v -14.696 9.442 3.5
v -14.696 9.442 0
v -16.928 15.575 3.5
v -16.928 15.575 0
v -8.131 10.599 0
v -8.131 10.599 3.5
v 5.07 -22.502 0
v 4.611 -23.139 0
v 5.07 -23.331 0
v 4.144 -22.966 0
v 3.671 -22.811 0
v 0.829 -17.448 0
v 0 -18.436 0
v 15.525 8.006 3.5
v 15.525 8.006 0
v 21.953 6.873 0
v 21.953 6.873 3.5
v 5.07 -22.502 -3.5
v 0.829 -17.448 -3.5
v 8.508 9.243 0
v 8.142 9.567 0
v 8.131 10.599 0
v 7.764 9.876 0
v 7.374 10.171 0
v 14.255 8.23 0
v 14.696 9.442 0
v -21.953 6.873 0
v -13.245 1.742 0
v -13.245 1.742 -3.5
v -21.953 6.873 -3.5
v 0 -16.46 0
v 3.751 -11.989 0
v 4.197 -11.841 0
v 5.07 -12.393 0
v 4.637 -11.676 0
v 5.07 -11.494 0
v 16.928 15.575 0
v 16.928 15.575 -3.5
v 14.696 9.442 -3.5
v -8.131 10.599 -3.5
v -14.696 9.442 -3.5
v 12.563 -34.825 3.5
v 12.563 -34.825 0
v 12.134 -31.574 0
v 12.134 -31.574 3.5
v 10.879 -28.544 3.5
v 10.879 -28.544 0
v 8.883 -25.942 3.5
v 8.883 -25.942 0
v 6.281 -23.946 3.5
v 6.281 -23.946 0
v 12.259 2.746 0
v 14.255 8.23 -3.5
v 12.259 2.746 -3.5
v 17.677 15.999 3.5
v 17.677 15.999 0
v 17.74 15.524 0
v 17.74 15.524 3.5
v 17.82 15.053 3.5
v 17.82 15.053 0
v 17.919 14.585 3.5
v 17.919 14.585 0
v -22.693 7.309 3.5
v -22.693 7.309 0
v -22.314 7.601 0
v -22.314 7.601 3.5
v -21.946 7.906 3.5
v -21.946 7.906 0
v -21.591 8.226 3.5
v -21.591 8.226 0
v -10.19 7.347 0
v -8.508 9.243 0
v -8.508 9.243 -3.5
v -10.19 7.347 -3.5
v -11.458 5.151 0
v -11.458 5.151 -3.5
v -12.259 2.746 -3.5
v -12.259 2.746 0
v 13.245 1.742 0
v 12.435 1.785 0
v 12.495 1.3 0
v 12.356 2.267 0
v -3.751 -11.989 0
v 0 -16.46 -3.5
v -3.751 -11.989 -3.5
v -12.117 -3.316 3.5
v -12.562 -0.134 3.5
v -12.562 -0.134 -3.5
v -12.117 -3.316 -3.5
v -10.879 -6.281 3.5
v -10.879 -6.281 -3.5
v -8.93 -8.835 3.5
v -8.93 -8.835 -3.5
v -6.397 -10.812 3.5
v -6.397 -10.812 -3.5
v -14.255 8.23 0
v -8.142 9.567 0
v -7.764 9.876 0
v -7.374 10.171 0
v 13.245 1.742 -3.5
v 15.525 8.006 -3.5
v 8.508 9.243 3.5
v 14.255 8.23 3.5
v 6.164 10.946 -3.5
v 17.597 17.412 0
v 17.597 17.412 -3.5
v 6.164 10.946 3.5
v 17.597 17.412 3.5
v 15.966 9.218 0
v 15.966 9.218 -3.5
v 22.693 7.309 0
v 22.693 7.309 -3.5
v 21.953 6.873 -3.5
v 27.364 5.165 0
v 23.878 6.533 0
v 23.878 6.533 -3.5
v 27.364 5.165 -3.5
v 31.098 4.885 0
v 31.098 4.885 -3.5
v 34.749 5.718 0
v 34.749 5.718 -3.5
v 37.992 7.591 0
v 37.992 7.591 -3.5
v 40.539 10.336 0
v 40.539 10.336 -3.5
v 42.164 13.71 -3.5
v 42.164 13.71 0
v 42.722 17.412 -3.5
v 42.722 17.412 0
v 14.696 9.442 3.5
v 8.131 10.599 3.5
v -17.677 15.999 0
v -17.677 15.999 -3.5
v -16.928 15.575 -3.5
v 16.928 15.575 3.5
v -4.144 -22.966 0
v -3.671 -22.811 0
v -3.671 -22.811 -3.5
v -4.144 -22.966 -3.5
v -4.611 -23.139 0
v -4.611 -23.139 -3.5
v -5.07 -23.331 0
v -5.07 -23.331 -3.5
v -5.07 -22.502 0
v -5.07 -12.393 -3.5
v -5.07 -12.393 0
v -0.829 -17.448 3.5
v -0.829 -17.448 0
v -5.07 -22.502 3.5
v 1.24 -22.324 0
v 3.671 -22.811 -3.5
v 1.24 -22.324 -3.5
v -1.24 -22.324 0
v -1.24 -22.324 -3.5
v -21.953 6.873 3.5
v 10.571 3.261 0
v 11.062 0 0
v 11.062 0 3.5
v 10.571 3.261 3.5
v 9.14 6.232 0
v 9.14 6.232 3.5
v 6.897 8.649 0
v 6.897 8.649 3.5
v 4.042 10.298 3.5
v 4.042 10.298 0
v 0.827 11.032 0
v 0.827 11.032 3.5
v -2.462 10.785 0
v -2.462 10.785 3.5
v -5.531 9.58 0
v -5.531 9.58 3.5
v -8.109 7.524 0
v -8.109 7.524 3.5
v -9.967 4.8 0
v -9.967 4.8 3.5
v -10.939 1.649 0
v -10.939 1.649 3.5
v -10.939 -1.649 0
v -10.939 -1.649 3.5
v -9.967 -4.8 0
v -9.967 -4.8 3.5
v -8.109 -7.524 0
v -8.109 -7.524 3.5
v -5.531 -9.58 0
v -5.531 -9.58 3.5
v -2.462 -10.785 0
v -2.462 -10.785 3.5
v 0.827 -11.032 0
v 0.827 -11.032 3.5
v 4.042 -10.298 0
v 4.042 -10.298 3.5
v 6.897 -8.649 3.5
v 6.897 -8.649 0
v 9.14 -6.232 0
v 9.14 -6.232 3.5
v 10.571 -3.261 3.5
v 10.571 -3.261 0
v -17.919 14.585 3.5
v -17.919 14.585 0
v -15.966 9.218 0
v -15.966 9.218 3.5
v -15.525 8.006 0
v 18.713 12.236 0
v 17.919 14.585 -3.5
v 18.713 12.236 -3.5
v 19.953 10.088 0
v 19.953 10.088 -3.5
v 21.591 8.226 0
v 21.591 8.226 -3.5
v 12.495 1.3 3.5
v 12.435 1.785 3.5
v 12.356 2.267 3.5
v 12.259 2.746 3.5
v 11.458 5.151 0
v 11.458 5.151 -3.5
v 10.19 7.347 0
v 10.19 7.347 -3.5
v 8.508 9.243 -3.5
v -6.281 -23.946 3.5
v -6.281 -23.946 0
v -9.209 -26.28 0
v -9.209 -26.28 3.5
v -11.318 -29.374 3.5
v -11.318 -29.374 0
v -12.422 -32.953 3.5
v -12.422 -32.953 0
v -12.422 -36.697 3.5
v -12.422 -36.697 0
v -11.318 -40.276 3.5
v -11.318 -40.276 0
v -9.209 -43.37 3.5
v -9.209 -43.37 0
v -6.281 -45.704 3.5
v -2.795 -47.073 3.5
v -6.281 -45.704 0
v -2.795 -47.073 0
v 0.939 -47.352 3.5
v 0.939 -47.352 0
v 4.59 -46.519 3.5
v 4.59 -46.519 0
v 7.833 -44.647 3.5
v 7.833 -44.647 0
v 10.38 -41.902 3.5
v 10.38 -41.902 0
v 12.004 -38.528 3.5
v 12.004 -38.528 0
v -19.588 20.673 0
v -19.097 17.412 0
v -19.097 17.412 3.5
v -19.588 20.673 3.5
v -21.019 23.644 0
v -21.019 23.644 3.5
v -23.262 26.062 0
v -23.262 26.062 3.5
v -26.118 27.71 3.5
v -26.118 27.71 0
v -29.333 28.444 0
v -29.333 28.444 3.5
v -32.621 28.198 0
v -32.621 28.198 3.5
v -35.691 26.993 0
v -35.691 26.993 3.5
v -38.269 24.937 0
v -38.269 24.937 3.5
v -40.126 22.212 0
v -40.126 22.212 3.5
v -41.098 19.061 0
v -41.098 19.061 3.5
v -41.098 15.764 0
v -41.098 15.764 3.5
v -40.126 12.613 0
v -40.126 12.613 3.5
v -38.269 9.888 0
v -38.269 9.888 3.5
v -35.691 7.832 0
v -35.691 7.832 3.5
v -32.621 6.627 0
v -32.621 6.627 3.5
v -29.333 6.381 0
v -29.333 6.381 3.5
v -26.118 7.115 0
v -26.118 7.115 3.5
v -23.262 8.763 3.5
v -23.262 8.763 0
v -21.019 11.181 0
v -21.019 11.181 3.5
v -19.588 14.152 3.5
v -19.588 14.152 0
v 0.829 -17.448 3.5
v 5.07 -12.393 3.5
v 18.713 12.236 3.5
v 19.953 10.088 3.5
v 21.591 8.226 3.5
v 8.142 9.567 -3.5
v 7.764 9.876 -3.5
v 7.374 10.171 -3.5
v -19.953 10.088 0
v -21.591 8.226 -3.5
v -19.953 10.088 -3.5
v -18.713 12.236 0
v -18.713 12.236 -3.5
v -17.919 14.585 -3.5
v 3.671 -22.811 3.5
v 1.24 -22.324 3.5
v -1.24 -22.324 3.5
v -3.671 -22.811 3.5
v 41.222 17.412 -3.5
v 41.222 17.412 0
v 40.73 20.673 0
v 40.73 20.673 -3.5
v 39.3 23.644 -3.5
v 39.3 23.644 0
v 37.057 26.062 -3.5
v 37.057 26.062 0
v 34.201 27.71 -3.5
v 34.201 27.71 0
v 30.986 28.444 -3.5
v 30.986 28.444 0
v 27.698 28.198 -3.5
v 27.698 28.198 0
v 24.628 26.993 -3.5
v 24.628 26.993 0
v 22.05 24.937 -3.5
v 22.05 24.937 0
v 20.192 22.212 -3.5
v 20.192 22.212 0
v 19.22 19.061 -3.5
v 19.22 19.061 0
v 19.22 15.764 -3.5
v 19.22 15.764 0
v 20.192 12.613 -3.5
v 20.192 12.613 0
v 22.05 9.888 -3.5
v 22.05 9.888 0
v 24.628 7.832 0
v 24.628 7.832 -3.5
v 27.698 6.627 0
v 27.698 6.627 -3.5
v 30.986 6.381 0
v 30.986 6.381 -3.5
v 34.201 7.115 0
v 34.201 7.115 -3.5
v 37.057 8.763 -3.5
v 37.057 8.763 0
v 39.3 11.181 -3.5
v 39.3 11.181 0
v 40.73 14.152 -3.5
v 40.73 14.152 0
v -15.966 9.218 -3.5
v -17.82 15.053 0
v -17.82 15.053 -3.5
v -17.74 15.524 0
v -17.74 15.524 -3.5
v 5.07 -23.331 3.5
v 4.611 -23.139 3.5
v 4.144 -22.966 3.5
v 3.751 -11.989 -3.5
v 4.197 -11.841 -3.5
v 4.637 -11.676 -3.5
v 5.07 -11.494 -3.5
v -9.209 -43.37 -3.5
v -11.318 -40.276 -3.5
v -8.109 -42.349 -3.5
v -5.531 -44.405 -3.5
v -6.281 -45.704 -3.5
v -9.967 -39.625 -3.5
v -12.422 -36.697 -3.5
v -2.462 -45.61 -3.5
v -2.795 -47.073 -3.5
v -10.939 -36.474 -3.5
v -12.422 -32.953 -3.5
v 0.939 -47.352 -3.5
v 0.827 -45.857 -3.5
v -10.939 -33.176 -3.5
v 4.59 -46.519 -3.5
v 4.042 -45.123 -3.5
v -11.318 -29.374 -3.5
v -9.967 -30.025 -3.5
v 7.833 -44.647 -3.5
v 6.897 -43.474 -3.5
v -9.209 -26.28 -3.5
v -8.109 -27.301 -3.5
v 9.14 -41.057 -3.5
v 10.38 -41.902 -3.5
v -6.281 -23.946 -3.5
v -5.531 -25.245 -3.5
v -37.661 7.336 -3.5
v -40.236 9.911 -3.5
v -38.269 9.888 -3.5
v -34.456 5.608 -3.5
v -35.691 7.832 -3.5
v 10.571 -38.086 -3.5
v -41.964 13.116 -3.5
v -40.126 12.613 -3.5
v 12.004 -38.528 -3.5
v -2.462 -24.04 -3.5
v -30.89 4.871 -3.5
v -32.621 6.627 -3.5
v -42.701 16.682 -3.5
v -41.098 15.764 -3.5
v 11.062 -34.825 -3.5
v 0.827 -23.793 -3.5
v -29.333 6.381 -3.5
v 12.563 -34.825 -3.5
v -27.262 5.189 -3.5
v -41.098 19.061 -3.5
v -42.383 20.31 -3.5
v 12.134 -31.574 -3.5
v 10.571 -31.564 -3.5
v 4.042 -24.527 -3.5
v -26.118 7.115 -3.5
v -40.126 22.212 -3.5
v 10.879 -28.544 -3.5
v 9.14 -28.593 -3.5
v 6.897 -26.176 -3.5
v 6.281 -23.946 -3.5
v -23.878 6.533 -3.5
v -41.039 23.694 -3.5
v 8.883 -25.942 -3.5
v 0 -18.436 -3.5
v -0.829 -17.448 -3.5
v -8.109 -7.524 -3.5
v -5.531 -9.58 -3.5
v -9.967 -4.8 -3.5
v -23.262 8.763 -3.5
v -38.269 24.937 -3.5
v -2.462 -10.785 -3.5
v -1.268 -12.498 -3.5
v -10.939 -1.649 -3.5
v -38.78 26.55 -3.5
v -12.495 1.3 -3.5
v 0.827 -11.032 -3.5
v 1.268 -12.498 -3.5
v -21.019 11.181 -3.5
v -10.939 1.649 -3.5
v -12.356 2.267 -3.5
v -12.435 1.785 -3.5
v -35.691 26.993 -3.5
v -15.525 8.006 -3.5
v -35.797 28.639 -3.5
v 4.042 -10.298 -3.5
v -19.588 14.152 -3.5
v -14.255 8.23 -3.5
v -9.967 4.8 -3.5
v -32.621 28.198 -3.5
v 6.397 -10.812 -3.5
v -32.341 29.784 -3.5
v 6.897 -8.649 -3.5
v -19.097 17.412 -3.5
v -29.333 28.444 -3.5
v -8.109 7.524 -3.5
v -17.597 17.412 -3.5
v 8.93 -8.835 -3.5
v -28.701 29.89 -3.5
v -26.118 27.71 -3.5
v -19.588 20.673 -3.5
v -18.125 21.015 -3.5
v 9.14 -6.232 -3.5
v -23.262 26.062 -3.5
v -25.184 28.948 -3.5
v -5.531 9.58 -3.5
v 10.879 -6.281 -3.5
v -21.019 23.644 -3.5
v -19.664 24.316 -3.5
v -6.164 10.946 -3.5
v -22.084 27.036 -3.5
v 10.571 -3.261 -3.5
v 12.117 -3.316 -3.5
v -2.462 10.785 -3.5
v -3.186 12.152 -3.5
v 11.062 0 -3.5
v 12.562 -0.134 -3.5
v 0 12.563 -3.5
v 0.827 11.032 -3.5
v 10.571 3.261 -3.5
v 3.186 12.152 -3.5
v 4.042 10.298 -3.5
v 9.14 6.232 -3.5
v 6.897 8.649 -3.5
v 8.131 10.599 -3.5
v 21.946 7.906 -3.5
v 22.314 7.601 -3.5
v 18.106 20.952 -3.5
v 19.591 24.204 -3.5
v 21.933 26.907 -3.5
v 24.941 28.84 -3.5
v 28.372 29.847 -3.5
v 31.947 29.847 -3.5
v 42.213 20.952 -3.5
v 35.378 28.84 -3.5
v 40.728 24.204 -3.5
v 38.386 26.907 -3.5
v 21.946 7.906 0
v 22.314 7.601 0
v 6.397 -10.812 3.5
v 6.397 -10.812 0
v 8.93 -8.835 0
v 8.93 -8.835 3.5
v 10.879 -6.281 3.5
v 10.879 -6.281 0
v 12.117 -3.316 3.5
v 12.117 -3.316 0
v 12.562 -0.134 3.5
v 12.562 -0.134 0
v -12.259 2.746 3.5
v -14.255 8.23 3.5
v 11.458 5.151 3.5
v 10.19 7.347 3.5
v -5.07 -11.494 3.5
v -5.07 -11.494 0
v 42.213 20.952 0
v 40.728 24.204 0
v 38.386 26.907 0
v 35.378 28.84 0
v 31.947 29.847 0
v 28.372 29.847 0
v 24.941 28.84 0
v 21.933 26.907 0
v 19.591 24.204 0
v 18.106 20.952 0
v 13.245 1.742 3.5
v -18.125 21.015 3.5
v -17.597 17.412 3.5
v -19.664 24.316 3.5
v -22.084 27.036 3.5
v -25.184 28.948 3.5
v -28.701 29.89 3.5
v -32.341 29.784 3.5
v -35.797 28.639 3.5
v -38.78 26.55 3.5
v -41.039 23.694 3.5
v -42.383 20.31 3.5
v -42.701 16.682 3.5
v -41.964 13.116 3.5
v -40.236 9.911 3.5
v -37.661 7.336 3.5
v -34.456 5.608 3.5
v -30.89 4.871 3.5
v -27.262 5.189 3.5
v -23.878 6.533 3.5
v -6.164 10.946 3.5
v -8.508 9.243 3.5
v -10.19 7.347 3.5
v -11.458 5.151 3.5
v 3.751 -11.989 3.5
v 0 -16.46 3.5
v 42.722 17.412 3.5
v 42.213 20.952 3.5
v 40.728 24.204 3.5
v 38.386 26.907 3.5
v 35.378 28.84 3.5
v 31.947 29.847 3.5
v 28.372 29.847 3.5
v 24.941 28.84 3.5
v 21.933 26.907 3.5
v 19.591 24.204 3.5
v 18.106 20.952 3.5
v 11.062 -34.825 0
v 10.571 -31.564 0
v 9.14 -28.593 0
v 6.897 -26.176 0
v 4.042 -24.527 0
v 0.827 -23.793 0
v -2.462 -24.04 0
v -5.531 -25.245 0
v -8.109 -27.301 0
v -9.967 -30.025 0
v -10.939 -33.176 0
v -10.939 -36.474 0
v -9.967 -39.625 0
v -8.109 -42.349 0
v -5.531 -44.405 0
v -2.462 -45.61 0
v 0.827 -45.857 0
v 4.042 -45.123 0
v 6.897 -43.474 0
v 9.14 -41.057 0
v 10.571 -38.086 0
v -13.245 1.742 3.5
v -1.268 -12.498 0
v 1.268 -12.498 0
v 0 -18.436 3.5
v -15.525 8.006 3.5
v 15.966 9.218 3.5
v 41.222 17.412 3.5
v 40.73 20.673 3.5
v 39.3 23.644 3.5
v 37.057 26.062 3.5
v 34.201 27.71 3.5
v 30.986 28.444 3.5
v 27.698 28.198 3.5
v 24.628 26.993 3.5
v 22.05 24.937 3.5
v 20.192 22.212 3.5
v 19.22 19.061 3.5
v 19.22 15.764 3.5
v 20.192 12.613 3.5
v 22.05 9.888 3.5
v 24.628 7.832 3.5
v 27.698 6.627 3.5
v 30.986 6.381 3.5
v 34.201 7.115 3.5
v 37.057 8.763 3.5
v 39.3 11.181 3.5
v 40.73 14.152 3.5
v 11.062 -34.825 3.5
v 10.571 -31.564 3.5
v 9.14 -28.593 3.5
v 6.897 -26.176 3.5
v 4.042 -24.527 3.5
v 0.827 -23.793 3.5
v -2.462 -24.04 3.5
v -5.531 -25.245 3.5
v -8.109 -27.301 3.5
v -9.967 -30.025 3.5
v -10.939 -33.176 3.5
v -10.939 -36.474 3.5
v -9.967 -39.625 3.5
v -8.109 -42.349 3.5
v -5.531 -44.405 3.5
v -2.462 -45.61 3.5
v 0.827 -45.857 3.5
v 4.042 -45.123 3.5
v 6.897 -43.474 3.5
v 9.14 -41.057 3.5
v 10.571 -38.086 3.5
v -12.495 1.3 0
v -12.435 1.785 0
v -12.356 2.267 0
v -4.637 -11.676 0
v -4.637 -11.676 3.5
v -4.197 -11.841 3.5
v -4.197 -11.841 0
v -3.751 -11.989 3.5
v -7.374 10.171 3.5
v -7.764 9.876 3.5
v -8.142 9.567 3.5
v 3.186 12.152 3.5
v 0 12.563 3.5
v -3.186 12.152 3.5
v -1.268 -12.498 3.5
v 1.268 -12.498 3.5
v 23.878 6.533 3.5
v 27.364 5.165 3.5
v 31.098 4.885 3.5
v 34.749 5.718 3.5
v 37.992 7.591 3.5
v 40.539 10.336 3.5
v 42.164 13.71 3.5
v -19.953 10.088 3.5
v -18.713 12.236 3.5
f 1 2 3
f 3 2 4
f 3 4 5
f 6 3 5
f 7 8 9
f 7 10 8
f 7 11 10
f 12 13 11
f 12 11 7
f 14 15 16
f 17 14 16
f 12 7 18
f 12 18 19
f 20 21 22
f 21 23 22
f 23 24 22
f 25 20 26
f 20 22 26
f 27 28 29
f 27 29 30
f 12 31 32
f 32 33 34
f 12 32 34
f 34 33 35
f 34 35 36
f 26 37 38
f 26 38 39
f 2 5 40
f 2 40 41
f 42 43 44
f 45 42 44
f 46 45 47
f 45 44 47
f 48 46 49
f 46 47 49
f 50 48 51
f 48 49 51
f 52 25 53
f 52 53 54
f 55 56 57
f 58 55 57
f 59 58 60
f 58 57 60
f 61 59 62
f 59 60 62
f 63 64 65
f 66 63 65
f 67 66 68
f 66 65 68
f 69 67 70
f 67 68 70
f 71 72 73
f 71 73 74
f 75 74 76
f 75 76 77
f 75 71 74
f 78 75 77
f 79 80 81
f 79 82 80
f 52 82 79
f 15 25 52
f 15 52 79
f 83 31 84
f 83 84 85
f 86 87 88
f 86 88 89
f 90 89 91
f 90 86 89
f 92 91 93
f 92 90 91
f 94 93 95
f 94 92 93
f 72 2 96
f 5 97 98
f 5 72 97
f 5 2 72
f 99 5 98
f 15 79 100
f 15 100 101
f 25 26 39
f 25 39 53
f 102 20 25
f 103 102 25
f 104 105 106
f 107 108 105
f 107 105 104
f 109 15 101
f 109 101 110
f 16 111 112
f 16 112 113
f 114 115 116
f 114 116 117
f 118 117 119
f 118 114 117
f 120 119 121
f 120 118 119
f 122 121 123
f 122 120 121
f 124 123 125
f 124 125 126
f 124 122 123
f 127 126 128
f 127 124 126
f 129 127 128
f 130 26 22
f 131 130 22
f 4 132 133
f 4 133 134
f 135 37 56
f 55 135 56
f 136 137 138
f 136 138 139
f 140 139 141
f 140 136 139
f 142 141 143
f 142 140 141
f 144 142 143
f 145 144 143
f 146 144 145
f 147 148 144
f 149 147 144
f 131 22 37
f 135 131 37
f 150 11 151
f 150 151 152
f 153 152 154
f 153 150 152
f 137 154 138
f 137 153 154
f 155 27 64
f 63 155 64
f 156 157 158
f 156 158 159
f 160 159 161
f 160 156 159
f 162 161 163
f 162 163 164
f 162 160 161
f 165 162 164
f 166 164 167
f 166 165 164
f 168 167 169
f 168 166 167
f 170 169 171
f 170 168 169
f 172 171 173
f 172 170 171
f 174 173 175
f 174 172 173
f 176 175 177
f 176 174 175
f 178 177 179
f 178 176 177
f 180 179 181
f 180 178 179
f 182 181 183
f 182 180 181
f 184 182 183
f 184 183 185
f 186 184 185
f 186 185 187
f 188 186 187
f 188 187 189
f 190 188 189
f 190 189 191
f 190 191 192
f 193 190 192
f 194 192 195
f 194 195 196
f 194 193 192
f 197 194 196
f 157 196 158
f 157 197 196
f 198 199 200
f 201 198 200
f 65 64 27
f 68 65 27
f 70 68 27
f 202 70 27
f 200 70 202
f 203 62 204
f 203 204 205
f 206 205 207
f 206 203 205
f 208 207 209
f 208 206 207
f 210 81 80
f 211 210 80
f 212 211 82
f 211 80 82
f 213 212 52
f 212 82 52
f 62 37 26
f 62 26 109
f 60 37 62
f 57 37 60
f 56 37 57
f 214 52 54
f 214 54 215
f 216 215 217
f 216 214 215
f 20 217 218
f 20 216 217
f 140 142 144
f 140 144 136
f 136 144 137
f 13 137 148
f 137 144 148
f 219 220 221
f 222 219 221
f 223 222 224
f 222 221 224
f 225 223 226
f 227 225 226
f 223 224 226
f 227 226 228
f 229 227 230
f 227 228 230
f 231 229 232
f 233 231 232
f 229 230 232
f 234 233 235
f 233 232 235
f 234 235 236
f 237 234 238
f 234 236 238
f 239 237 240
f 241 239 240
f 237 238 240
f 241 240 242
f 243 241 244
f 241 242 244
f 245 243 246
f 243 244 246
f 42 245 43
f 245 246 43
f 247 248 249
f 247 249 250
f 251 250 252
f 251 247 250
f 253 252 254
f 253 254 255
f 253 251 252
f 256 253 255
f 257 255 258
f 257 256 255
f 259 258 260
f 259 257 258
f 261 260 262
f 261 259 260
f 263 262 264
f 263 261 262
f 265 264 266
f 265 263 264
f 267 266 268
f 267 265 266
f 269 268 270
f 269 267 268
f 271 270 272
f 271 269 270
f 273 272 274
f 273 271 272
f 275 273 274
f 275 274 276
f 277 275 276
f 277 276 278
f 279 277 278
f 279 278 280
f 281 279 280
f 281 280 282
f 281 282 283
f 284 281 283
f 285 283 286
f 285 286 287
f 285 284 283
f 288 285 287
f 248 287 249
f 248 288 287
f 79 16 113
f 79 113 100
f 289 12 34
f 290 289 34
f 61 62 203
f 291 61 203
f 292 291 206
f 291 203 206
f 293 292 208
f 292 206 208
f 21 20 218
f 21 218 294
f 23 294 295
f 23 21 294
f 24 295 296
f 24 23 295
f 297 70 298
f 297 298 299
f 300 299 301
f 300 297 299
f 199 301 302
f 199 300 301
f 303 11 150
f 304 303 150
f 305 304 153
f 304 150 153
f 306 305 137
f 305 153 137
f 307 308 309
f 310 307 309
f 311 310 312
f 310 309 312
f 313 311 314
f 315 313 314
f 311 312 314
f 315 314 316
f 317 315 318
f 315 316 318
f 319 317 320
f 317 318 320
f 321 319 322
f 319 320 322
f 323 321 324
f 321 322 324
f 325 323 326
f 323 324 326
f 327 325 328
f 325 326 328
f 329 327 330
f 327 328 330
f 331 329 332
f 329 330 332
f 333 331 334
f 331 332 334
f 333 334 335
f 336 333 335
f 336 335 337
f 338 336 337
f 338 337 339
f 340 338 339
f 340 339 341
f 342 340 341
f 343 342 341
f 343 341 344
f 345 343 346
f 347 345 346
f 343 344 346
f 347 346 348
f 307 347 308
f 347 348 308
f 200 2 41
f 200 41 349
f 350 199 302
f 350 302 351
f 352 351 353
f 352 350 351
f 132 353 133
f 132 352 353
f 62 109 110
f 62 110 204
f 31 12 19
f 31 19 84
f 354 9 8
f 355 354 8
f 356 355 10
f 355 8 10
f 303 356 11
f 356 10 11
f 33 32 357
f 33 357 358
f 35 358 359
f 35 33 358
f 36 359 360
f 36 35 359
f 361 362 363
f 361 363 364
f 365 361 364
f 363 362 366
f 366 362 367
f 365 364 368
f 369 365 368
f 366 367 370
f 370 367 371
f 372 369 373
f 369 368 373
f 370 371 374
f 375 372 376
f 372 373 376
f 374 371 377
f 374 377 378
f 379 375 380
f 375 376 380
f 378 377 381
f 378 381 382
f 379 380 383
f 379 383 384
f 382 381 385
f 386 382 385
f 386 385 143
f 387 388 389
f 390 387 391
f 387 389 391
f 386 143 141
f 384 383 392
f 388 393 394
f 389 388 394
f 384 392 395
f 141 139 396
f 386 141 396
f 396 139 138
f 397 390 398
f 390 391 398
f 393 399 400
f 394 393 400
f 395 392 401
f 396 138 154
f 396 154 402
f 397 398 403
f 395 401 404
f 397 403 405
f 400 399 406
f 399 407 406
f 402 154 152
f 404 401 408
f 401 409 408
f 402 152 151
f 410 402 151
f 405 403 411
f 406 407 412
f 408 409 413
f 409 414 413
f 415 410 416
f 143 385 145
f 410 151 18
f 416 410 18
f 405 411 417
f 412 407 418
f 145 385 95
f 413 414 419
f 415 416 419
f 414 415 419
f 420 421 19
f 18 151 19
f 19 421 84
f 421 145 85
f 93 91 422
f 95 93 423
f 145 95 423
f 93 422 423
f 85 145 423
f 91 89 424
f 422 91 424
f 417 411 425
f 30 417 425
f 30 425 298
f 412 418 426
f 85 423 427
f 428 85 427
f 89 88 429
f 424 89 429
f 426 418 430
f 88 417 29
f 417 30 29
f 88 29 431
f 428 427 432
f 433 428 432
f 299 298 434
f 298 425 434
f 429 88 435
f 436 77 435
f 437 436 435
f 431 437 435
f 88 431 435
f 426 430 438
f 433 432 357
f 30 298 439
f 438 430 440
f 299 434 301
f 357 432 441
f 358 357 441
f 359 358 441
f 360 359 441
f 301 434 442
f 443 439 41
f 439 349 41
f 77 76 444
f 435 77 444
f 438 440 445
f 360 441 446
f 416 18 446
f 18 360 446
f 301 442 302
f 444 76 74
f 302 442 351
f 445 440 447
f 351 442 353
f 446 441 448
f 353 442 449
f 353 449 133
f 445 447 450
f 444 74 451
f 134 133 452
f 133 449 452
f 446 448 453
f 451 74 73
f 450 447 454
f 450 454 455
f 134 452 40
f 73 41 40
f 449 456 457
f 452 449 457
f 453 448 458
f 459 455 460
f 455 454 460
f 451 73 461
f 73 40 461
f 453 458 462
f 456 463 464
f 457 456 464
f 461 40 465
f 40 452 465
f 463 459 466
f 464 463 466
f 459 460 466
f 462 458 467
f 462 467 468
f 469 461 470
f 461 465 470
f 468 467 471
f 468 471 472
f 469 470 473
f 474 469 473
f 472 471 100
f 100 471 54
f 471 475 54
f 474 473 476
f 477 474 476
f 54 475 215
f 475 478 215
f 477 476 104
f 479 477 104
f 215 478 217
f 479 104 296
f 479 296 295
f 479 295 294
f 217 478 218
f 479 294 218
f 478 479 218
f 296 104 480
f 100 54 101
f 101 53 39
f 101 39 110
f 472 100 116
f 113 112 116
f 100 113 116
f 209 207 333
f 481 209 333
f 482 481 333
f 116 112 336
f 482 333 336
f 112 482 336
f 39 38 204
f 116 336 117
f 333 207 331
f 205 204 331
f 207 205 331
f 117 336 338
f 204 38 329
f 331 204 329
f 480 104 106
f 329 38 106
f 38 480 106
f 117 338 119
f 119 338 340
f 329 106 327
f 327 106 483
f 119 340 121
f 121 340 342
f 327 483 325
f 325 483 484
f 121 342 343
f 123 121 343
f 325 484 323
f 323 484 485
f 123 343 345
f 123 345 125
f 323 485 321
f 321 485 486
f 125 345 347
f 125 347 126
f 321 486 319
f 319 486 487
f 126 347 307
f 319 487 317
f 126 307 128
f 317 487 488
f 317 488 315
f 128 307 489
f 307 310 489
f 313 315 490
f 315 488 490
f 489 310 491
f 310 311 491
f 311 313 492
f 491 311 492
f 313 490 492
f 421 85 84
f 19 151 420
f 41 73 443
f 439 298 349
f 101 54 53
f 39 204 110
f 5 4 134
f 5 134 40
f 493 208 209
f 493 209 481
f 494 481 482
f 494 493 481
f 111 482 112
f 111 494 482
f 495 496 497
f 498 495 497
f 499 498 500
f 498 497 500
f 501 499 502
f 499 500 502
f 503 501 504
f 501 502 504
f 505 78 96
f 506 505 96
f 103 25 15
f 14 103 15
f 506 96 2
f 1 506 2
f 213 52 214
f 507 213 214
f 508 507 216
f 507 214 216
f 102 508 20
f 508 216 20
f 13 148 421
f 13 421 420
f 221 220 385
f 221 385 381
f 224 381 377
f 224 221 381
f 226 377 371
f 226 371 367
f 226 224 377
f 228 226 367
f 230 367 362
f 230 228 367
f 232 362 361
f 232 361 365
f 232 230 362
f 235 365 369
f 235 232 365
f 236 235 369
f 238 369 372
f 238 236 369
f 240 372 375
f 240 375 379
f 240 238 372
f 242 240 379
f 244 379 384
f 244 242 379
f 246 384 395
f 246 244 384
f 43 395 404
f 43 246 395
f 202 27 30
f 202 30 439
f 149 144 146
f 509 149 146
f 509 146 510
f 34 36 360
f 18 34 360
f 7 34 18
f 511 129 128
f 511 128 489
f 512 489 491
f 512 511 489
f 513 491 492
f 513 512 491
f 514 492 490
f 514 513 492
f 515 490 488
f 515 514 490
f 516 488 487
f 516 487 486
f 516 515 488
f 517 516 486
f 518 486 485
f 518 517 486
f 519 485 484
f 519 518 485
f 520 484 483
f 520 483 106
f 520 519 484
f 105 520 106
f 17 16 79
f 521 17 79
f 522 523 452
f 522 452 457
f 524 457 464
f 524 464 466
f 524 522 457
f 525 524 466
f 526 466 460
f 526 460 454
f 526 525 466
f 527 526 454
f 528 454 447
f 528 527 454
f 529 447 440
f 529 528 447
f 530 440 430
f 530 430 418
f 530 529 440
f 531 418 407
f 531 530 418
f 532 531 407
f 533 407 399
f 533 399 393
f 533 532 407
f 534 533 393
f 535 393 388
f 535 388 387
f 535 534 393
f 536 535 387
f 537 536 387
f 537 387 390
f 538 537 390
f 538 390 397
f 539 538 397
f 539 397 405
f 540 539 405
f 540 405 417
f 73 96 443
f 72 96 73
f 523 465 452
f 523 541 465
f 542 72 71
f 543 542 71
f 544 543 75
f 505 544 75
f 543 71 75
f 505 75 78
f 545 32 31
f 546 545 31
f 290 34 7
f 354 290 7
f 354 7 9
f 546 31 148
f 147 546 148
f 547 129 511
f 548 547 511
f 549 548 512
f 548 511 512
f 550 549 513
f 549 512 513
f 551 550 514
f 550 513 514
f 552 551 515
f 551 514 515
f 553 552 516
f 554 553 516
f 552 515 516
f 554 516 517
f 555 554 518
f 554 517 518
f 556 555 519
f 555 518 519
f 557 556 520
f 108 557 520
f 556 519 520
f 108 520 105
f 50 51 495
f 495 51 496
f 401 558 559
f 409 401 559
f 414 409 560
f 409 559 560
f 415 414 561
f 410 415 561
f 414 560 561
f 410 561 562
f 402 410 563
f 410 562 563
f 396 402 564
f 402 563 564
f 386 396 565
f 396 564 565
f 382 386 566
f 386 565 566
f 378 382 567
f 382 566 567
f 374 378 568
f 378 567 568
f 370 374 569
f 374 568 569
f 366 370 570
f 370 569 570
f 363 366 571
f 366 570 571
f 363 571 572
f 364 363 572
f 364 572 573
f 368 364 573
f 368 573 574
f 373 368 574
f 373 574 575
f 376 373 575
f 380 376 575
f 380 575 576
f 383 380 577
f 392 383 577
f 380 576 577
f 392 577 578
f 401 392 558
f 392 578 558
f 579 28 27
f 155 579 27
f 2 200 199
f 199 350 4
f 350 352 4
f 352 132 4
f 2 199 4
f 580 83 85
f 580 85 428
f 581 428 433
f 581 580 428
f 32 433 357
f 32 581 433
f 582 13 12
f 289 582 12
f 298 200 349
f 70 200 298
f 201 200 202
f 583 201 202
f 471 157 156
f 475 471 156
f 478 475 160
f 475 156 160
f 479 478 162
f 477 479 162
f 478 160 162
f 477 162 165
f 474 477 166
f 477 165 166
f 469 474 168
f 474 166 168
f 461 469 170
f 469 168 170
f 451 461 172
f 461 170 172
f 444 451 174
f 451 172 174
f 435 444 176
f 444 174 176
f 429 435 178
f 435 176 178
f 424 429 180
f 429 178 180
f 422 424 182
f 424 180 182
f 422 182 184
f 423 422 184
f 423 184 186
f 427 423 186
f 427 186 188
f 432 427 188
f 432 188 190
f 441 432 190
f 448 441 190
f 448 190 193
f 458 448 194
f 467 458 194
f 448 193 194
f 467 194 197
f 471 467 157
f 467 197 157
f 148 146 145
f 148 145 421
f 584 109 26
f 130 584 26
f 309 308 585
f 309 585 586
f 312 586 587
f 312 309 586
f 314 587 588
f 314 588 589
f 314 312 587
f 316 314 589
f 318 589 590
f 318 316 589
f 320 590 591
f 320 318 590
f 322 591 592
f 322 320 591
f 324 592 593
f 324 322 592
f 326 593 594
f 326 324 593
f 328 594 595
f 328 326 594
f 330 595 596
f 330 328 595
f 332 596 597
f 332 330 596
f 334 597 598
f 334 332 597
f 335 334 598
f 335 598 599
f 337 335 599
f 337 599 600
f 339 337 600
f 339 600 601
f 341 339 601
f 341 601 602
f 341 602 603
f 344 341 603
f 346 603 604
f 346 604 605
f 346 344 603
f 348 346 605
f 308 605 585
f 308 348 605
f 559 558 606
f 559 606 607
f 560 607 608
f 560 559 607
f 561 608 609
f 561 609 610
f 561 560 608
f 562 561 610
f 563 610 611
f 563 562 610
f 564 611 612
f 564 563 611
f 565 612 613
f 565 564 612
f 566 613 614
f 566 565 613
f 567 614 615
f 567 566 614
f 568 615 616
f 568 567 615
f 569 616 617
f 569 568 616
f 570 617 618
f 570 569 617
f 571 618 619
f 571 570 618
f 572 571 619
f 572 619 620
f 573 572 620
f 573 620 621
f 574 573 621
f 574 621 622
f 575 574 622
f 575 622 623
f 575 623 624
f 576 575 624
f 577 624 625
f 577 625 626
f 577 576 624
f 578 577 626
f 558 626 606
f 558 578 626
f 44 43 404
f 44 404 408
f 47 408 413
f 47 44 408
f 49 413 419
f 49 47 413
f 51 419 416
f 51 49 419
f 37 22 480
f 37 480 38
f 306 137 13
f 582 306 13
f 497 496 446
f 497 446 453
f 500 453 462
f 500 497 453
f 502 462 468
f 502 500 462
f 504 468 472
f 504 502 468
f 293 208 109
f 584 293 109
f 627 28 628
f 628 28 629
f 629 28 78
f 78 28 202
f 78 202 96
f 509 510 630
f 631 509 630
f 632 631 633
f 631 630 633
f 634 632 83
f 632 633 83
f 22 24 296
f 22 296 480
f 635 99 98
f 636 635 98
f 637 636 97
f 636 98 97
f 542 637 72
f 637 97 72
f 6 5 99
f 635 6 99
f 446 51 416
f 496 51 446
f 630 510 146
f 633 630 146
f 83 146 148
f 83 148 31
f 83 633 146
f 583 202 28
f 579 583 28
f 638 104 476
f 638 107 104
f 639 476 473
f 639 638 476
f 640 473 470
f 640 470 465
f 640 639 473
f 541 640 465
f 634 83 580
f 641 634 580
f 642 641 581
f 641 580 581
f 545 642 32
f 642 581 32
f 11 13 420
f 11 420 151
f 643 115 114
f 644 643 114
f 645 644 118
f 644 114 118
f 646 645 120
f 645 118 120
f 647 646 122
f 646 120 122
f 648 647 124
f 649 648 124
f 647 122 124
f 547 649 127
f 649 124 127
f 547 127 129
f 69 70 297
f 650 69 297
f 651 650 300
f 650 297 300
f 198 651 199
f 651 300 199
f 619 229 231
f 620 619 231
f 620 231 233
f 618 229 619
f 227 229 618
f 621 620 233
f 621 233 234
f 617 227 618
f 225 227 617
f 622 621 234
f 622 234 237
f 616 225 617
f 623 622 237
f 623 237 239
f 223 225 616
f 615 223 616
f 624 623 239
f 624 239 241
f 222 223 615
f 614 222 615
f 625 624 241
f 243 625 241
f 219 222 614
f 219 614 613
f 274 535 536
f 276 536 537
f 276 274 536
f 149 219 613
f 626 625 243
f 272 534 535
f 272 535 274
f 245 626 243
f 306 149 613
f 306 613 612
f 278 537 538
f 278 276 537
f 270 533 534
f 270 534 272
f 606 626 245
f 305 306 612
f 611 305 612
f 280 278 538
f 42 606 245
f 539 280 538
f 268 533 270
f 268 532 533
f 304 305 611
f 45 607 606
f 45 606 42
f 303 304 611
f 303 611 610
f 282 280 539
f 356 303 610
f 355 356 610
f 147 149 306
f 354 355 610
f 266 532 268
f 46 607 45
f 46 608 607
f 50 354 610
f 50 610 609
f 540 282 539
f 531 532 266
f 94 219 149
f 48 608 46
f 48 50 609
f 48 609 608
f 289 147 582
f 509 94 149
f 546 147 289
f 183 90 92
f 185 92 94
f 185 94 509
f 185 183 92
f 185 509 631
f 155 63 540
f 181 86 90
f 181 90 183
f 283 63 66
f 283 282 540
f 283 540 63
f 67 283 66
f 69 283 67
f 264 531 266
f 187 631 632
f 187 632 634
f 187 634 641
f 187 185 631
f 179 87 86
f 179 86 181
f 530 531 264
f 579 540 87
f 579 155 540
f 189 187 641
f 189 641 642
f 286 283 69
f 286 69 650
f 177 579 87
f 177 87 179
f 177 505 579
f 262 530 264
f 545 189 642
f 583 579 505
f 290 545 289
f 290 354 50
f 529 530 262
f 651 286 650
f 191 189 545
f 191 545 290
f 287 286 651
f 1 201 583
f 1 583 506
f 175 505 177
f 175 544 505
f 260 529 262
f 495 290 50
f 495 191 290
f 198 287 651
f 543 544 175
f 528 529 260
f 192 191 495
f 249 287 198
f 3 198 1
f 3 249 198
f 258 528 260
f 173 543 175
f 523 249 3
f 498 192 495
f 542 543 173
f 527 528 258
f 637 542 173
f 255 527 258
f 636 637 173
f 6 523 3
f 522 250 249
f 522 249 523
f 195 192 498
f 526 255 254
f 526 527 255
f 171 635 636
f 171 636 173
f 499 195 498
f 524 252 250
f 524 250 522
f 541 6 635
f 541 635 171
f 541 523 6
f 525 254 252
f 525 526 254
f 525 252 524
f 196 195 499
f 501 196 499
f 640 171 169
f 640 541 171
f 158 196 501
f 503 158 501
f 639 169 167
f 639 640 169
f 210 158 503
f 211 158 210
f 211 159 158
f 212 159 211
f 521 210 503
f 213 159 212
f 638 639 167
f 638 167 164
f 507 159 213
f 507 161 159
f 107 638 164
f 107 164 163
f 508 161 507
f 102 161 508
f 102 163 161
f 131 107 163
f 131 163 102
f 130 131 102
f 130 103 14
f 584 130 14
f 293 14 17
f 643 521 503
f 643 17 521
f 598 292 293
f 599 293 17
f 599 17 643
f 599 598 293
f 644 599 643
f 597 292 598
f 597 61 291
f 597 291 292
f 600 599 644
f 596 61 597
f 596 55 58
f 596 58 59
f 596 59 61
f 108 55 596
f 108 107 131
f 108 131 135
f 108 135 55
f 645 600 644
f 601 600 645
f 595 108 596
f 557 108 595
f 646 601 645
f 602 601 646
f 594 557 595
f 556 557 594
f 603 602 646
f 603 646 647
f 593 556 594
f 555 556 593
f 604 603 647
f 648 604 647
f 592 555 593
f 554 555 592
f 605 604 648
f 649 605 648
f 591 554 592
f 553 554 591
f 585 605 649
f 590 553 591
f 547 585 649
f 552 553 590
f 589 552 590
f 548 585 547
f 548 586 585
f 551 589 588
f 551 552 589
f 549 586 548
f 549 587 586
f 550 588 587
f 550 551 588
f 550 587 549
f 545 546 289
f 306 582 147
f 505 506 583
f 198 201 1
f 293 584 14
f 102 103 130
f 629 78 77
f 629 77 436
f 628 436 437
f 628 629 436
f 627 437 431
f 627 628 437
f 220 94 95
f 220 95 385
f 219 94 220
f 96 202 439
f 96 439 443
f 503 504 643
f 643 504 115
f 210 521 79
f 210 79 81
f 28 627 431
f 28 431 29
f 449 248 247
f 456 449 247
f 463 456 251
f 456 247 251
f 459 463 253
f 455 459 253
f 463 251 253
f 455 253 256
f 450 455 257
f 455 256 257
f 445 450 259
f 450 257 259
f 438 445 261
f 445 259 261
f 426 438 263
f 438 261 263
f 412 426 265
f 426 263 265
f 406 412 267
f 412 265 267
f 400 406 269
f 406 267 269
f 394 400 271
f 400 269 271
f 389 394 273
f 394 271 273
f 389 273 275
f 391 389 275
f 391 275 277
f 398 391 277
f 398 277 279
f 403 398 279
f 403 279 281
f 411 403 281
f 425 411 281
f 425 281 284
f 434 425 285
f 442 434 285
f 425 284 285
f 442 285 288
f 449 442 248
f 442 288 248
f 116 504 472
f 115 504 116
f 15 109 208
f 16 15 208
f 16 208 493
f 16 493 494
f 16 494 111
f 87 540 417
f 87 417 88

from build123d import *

# Parameters (mm, degrees)
F0_R     = 11.0625
F1_DEPTH = 3.5
F2_DEPTH = 3.5


with BuildPart() as f1:
    # F0 (on Top) → F1 (new body)
    with BuildSketch(Plane.XY):
        with BuildLine():
            ThreePointArc((12.5625, -34.825), (10.879444135, -28.54375), (6.28125, -23.945555865))
            ThreePointArc((6.28125, -23.945555865), (5.6839265838, -23.6219028907), (5.0699800766, -23.3310142565))
            ThreePointArc((5.0699800766, -23.3310142565), (4.3783795457, -23.0501879504), (3.671321038, -22.8109329082))
            ThreePointArc((3.671321038, -22.8109329082), (0, -22.2625), (-3.671321038, -22.8109329082))
            ThreePointArc((-3.671321038, -22.8109329082), (-4.3783795457, -23.0501879504), (-5.0699800766, -23.3310142565))
            ThreePointArc((-5.0699800766, -23.3310142565), (-5.6839265838, -23.6219028907), (-6.28125, -23.945555865))
            ThreePointArc((-6.28125, -23.945555865), (-6.28125, -45.704444135), (12.5625, -34.825))
        make_face()
        with Locations((0, -34.825)):
            Circle(F0_R, mode=Mode.SUBTRACT)
        with BuildLine():
            ThreePointArc((22.6934953293, 7.3091515977), (23.2748450472, 6.9043979519), (23.8780846868, 6.533055865))
            ThreePointArc((23.8780846868, 6.533055865), (36.4405846868, 6.533055865), (42.7218346868, 17.4125))
            ThreePointArc((42.7218346868, 17.4125), (30.1593346868, 29.975), (17.5968346868, 17.4125))
            ThreePointArc((17.5968346868, 17.4125), (17.6168065478, 16.7044081041), (17.6766586284, 15.998567657))
            ThreePointArc((17.6766586284, 15.998567657), (17.777731299, 15.2882816033), (17.9191868635, 14.5849237385))
            ThreePointArc((17.9191868635, 14.5849237385), (19.2798905518, 11.13125), (21.5905079016, 8.2260091697))
            ThreePointArc((21.5905079016, 8.2260091697), (22.1289058982, 7.7518261249), (22.6934953293, 7.3091515977))
        make_face()
        with Locations((30.1593346868, 17.4125)):
            Circle(F0_R, mode=Mode.SUBTRACT)
        with BuildLine():
            ThreePointArc((-17.6766586284, 15.998567657), (-17.6168065478, 16.7044081041), (-17.5968346868, 17.4125))
            ThreePointArc((-17.5968346868, 17.4125), (-41.0387788218, 23.69375), (-23.8780846868, 6.533055865))
            ThreePointArc((-23.8780846868, 6.533055865), (-23.2748450472, 6.9043979519), (-22.6934953293, 7.3091515977))
            ThreePointArc((-22.6934953293, 7.3091515977), (-22.1289058982, 7.7518261249), (-21.5905079016, 8.2260091697))
            ThreePointArc((-21.5905079016, 8.2260091697), (-19.2798905518, 11.13125), (-17.9191868635, 14.5849237385))
            ThreePointArc((-17.9191868635, 14.5849237385), (-17.777731299, 15.2882816033), (-17.6766586284, 15.998567657))
        make_face()
        with Locations((-30.1593346868, 17.4125)):
            Circle(F0_R, mode=Mode.SUBTRACT)
        with BuildLine():
            ThreePointArc((12.5617807334, -0.134428631), (12.5623201821, -0.0672152776), (12.5625, 0))
            ThreePointArc((12.5625, 0), (12.5456200156, 0.6510181823), (12.4950254251, 1.300286844))
            ThreePointArc((12.4950254251, 1.300286844), (12.3979510712, 2.0266266272), (12.2586909143, 2.7460705232))
            ThreePointArc((12.2586909143, 2.7460705232), (10.879444135, 6.28125), (8.5075122908, 9.2433024873))
            ThreePointArc((8.5075122908, 9.2433024873), (7.9540856787, 9.723627269), (7.3735941516, 10.1708660171))
            ThreePointArc((7.3735941516, 10.1708660171), (6.7801201382, 10.5757447568), (6.1644717573, 10.9460355474))
            ThreePointArc((6.1644717573, 10.9460355474), (0, 12.5625), (-6.1644717573, 10.9460355474))
            ThreePointArc((-6.1644717573, 10.9460355474), (-6.7801201382, 10.5757447568), (-7.3735941516, 10.1708660171))
            ThreePointArc((-7.3735941516, 10.1708660171), (-7.9540856787, 9.723627269), (-8.5075122908, 9.2433024873))
            ThreePointArc((-8.5075122908, 9.2433024873), (-10.879444135, 6.28125), (-12.2586909143, 2.7460705232))
            ThreePointArc((-12.2586909143, 2.7460705232), (-12.3979510712, 2.0266266272), (-12.4950254251, 1.300286844))
            ThreePointArc((-12.4950254251, 1.300286844), (-12.5489236925, 0.583883902), (-12.5617807334, -0.134428631))
            ThreePointArc((-12.5617807334, -0.134428631), (-10.879444135, -6.28125), (-6.3973089761, -10.8116069164))
            ThreePointArc((-6.3973089761, -10.8116069164), (-5.7437870583, -11.1725250718), (-5.0699800766, -11.4939857435))
            ThreePointArc((-5.0699800766, -11.4939857435), (-4.4175289857, -11.760180437), (-3.7511786235, -11.9893730105))
            ThreePointArc((-3.7511786235, -11.9893730105), (0, -12.5625), (3.7511786235, -11.9893730105))
            ThreePointArc((3.7511786235, -11.9893730105), (4.4175289857, -11.760180437), (5.0699800766, -11.4939857435))
            ThreePointArc((5.0699800766, -11.4939857435), (5.7437870583, -11.1725250718), (6.3973089761, -10.8116069164))
            ThreePointArc((6.3973089761, -10.8116069164), (10.879444135, -6.28125), (12.5617807334, -0.134428631))
        make_face()
        Circle(F0_R, mode=Mode.SUBTRACT)
        with BuildLine():
            ThreePointArc((-22.6934953293, 7.3091515977), (-23.2748450472, 6.9043979519), (-23.8780846868, 6.533055865))
            Line((-23.8780846868, 6.533055865), (-21.9525338245, 6.8725824347))
            Line((-21.9525338245, 6.8725824347), (-22.6934953293, 7.3091515977))
        make_face()
        Polygon((-23.8780846868, 6.533055865), (-12.5617807334, -0.134428631), (-13.2447523803, 1.742020547), (-21.9525338245, 6.8725824347), align=None)
        with BuildLine():
            Line((-13.2447523803, 1.742020547), (-12.5617807334, -0.134428631))
            ThreePointArc((-12.5617807334, -0.134428631), (-12.5489236925, 0.583883902), (-12.4950254251, 1.300286844))
            Line((-12.4950254251, 1.300286844), (-13.2447523803, 1.742020547))
        make_face()
        Polygon((-8.1310102377, 10.5992817546), (-6.1644717573, 10.9460355474), (-17.5968346868, 17.4125), (-16.9280978903, 15.5751607521), align=None)
        with BuildLine():
            Line((-16.9280978903, 15.5751607521), (-17.5968346868, 17.4125))
            ThreePointArc((-17.5968346868, 17.4125), (-17.6168065478, 16.7044081041), (-17.6766586284, 15.998567657))
            Line((-17.6766586284, 15.998567657), (-16.9280978903, 15.5751607521))
        make_face()
        with BuildLine():
            ThreePointArc((-7.3735941516, 10.1708660171), (-6.7801201382, 10.5757447568), (-6.1644717573, 10.9460355474))
            Line((-6.1644717573, 10.9460355474), (-8.1310102377, 10.5992817546))
            Line((-8.1310102377, 10.5992817546), (-7.3735941516, 10.1708660171))
        make_face()
        with BuildLine():
            Line((-5.0699800766, -22.5020205822), (-6.28125, -23.945555865))
            ThreePointArc((-6.28125, -23.945555865), (-5.6839265838, -23.6219028907), (-5.0699800766, -23.3310142565))
            Line((-5.0699800766, -23.3310142565), (-5.0699800766, -22.5020205822))
        make_face()
        Polygon((-6.3973089761, -10.8116069164), (-6.28125, -23.945555865), (-5.0699800766, -22.5020205822), (-5.0699800766, -12.3934559009), align=None)
        with BuildLine():
            Line((-5.0699800766, -12.3934559009), (-5.0699800766, -11.4939857435))
            ThreePointArc((-5.0699800766, -11.4939857435), (-5.7437870583, -11.1725250718), (-6.3973089761, -10.8116069164))
            Line((-6.3973089761, -10.8116069164), (-5.0699800766, -12.3934559009))
        make_face()
        with BuildLine():
            Line((5.0699800766, -12.3934559009), (6.3973089761, -10.8116069164))
            ThreePointArc((6.3973089761, -10.8116069164), (5.7437870583, -11.1725250718), (5.0699800766, -11.4939857435))
            Line((5.0699800766, -11.4939857435), (5.0699800766, -12.3934559009))
        make_face()
        Polygon((6.28125, -23.945555865), (6.3973089761, -10.8116069164), (5.0699800766, -12.3934559009), (5.0699800766, -22.5020205822), align=None)
        with BuildLine():
            ThreePointArc((5.0699800766, -23.3310142565), (5.6839265838, -23.6219028907), (6.28125, -23.945555865))
            Line((6.28125, -23.945555865), (5.0699800766, -22.5020205822))
            Line((5.0699800766, -22.5020205822), (5.0699800766, -23.3310142565))
        make_face()
        with BuildLine():
            Line((-3.671321038, -22.8109329082), (0, -18.4356228716))
            Line((0, -18.4356228716), (-0.8289336287, -17.4477382415))
            Line((-0.8289336287, -17.4477382415), (-5.0699800766, -22.5020205822))
            Line((-5.0699800766, -22.5020205822), (-5.0699800766, -23.3310142565))
            ThreePointArc((-5.0699800766, -23.3310142565), (-4.3783795457, -23.0501879504), (-3.671321038, -22.8109329082))
        make_face()
        Polygon((0, -18.4356228716), (0.8289336287, -17.4477382415), (0, -16.4598536115), (-0.8289336287, -17.4477382415), align=None)
        with BuildLine():
            Line((5.0699800766, -12.3934559009), (5.0699800766, -11.4939857435))
            ThreePointArc((5.0699800766, -11.4939857435), (4.4175289857, -11.760180437), (3.7511786235, -11.9893730105))
            Line((3.7511786235, -11.9893730105), (0, -16.4598536115))
            Line((0, -16.4598536115), (0.8289336287, -17.4477382415))
            Line((0.8289336287, -17.4477382415), (5.0699800766, -12.3934559009))
        make_face()
        Polygon((13.2447523803, 1.742020547), (12.5617807334, -0.134428631), (23.8780846868, 6.533055865), (21.9525338245, 6.8725824347), align=None)
        with BuildLine():
            ThreePointArc((12.4950254251, 1.300286844), (12.5456200156, 0.6510181823), (12.5625, 0))
            ThreePointArc((12.5625, 0), (12.5623201821, -0.0672152776), (12.5617807334, -0.134428631))
            Line((12.5617807334, -0.134428631), (13.2447523803, 1.742020547))
            Line((13.2447523803, 1.742020547), (12.4950254251, 1.300286844))
        make_face()
        with BuildLine():
            Line((21.9525338245, 6.8725824347), (23.8780846868, 6.533055865))
            ThreePointArc((23.8780846868, 6.533055865), (23.2748450472, 6.9043979519), (22.6934953293, 7.3091515977))
            Line((22.6934953293, 7.3091515977), (21.9525338245, 6.8725824347))
        make_face()
        Polygon((16.9280978903, 15.5751607521), (17.5968346868, 17.4125), (6.1644717573, 10.9460355474), (8.1310102377, 10.5992817546), align=None)
        with BuildLine():
            ThreePointArc((6.1644717573, 10.9460355474), (6.7801201382, 10.5757447568), (7.3735941516, 10.1708660171))
            Line((7.3735941516, 10.1708660171), (8.1310102377, 10.5992817546))
            Line((8.1310102377, 10.5992817546), (6.1644717573, 10.9460355474))
        make_face()
        with BuildLine():
            ThreePointArc((17.6766586284, 15.998567657), (17.6168065478, 16.7044081041), (17.5968346868, 17.4125))
            Line((17.5968346868, 17.4125), (16.9280978903, 15.5751607521))
            Line((16.9280978903, 15.5751607521), (17.6766586284, 15.998567657))
        make_face()
        with BuildLine():
            Line((15.9657177414, 9.2178114358), (15.5246513701, 8.0059915402))
            Line((15.5246513701, 8.0059915402), (21.9525338245, 6.8725824347))
            Line((21.9525338245, 6.8725824347), (22.6934953293, 7.3091515977))
            ThreePointArc((22.6934953293, 7.3091515977), (22.1289058982, 7.7518261249), (21.5905079016, 8.2260091697))
            Line((21.5905079016, 8.2260091697), (15.9657177414, 9.2178114358))
        make_face()
        Polygon((14.6957177414, 9.4417467013), (14.2546513701, 8.2299268057), (15.5246513701, 8.0059915402), (15.9657177414, 9.2178114358), align=None)
        with BuildLine():
            ThreePointArc((7.3735941516, 10.1708660171), (7.9540856787, 9.723627269), (8.5075122908, 9.2433024873))
            Line((8.5075122908, 9.2433024873), (14.2546513701, 8.2299268057))
            Line((14.2546513701, 8.2299268057), (14.6957177414, 9.4417467013))
            Line((14.6957177414, 9.4417467013), (8.1310102377, 10.5992817546))
            Line((8.1310102377, 10.5992817546), (7.3735941516, 10.1708660171))
        make_face()
        with BuildLine():
            Line((-15.9657177414, 9.2178114358), (-14.6957177414, 9.4417467013))
            Line((-14.6957177414, 9.4417467013), (-16.9280978903, 15.5751607521))
            Line((-16.9280978903, 15.5751607521), (-17.6766586284, 15.998567657))
            ThreePointArc((-17.6766586284, 15.998567657), (-17.777731299, 15.2882816033), (-17.9191868635, 14.5849237385))
            Line((-17.9191868635, 14.5849237385), (-15.9657177414, 9.2178114358))
        make_face()
        Polygon((-14.2546513701, 8.2299268057), (-14.6957177414, 9.4417467013), (-15.9657177414, 9.2178114358), (-15.5246513701, 8.0059915402), align=None)
        with BuildLine():
            Line((-13.2447523803, 1.742020547), (-12.4950254251, 1.300286844))
            ThreePointArc((-12.4950254251, 1.300286844), (-12.3979510712, 2.0266266272), (-12.2586909143, 2.7460705232))
            Line((-12.2586909143, 2.7460705232), (-14.2546513701, 8.2299268057))
            Line((-14.2546513701, 8.2299268057), (-15.5246513701, 8.0059915402))
            Line((-15.5246513701, 8.0059915402), (-13.2447523803, 1.742020547))
        make_face()
    extrude(amount=F1_DEPTH)

    # F0 (on Top) → F2 (join)
    with BuildSketch(Plane.XY):
        with BuildLine():
            Line((-13.2447523803, 1.742020547), (-12.5617807334, -0.134428631))
            ThreePointArc((-12.5617807334, -0.134428631), (-12.5489236925, 0.583883902), (-12.4950254251, 1.300286844))
            Line((-12.4950254251, 1.300286844), (-13.2447523803, 1.742020547))
        make_face()
        Polygon((-23.8780846868, 6.533055865), (-12.5617807334, -0.134428631), (-13.2447523803, 1.742020547), (-21.9525338245, 6.8725824347), align=None)
        with BuildLine():
            ThreePointArc((-22.6934953293, 7.3091515977), (-23.2748450472, 6.9043979519), (-23.8780846868, 6.533055865))
            Line((-23.8780846868, 6.533055865), (-21.9525338245, 6.8725824347))
            Line((-21.9525338245, 6.8725824347), (-22.6934953293, 7.3091515977))
        make_face()
        with BuildLine():
            ThreePointArc((-17.6766586284, 15.998567657), (-17.6168065478, 16.7044081041), (-17.5968346868, 17.4125))
            ThreePointArc((-17.5968346868, 17.4125), (-41.0387788218, 23.69375), (-23.8780846868, 6.533055865))
            ThreePointArc((-23.8780846868, 6.533055865), (-23.2748450472, 6.9043979519), (-22.6934953293, 7.3091515977))
            ThreePointArc((-22.6934953293, 7.3091515977), (-22.1289058982, 7.7518261249), (-21.5905079016, 8.2260091697))
            ThreePointArc((-21.5905079016, 8.2260091697), (-19.2798905518, 11.13125), (-17.9191868635, 14.5849237385))
            ThreePointArc((-17.9191868635, 14.5849237385), (-17.777731299, 15.2882816033), (-17.6766586284, 15.998567657))
        make_face()
        with Locations((-30.1593346868, 17.4125)):
            Circle(F0_R, mode=Mode.SUBTRACT)
        with BuildLine():
            Line((-16.9280978903, 15.5751607521), (-17.5968346868, 17.4125))
            ThreePointArc((-17.5968346868, 17.4125), (-17.6168065478, 16.7044081041), (-17.6766586284, 15.998567657))
            Line((-17.6766586284, 15.998567657), (-16.9280978903, 15.5751607521))
        make_face()
        Polygon((-8.1310102377, 10.5992817546), (-6.1644717573, 10.9460355474), (-17.5968346868, 17.4125), (-16.9280978903, 15.5751607521), align=None)
        with BuildLine():
            ThreePointArc((-7.3735941516, 10.1708660171), (-6.7801201382, 10.5757447568), (-6.1644717573, 10.9460355474))
            Line((-6.1644717573, 10.9460355474), (-8.1310102377, 10.5992817546))
            Line((-8.1310102377, 10.5992817546), (-7.3735941516, 10.1708660171))
        make_face()
        with BuildLine():
            ThreePointArc((22.6934953293, 7.3091515977), (23.2748450472, 6.9043979519), (23.8780846868, 6.533055865))
            ThreePointArc((23.8780846868, 6.533055865), (36.4405846868, 6.533055865), (42.7218346868, 17.4125))
            ThreePointArc((42.7218346868, 17.4125), (30.1593346868, 29.975), (17.5968346868, 17.4125))
            ThreePointArc((17.5968346868, 17.4125), (17.6168065478, 16.7044081041), (17.6766586284, 15.998567657))
            ThreePointArc((17.6766586284, 15.998567657), (17.777731299, 15.2882816033), (17.9191868635, 14.5849237385))
            ThreePointArc((17.9191868635, 14.5849237385), (19.2798905518, 11.13125), (21.5905079016, 8.2260091697))
            ThreePointArc((21.5905079016, 8.2260091697), (22.1289058982, 7.7518261249), (22.6934953293, 7.3091515977))
        make_face()
        with Locations((30.1593346868, 17.4125)):
            Circle(F0_R, mode=Mode.SUBTRACT)
        with BuildLine():
            ThreePointArc((17.6766586284, 15.998567657), (17.6168065478, 16.7044081041), (17.5968346868, 17.4125))
            Line((17.5968346868, 17.4125), (16.9280978903, 15.5751607521))
            Line((16.9280978903, 15.5751607521), (17.6766586284, 15.998567657))
        make_face()
        Polygon((16.9280978903, 15.5751607521), (17.5968346868, 17.4125), (6.1644717573, 10.9460355474), (8.1310102377, 10.5992817546), align=None)
        with BuildLine():
            ThreePointArc((6.1644717573, 10.9460355474), (6.7801201382, 10.5757447568), (7.3735941516, 10.1708660171))
            Line((7.3735941516, 10.1708660171), (8.1310102377, 10.5992817546))
            Line((8.1310102377, 10.5992817546), (6.1644717573, 10.9460355474))
        make_face()
        Polygon((13.2447523803, 1.742020547), (12.5617807334, -0.134428631), (23.8780846868, 6.533055865), (21.9525338245, 6.8725824347), align=None)
        with BuildLine():
            Line((21.9525338245, 6.8725824347), (23.8780846868, 6.533055865))
            ThreePointArc((23.8780846868, 6.533055865), (23.2748450472, 6.9043979519), (22.6934953293, 7.3091515977))
            Line((22.6934953293, 7.3091515977), (21.9525338245, 6.8725824347))
        make_face()
        with BuildLine():
            ThreePointArc((12.4950254251, 1.300286844), (12.5456200156, 0.6510181823), (12.5625, 0))
            ThreePointArc((12.5625, 0), (12.5623201821, -0.0672152776), (12.5617807334, -0.134428631))
            Line((12.5617807334, -0.134428631), (13.2447523803, 1.742020547))
            Line((13.2447523803, 1.742020547), (12.4950254251, 1.300286844))
        make_face()
        with BuildLine():
            ThreePointArc((12.5625, -34.825), (10.879444135, -28.54375), (6.28125, -23.945555865))
            ThreePointArc((6.28125, -23.945555865), (5.6839265838, -23.6219028907), (5.0699800766, -23.3310142565))
            ThreePointArc((5.0699800766, -23.3310142565), (4.3783795457, -23.0501879504), (3.671321038, -22.8109329082))
            ThreePointArc((3.671321038, -22.8109329082), (0, -22.2625), (-3.671321038, -22.8109329082))
            ThreePointArc((-3.671321038, -22.8109329082), (-4.3783795457, -23.0501879504), (-5.0699800766, -23.3310142565))
            ThreePointArc((-5.0699800766, -23.3310142565), (-5.6839265838, -23.6219028907), (-6.28125, -23.945555865))
            ThreePointArc((-6.28125, -23.945555865), (-6.28125, -45.704444135), (12.5625, -34.825))
        make_face()
        with Locations((0, -34.825)):
            Circle(F0_R, mode=Mode.SUBTRACT)
        with BuildLine():
            ThreePointArc((5.0699800766, -23.3310142565), (5.6839265838, -23.6219028907), (6.28125, -23.945555865))
            Line((6.28125, -23.945555865), (5.0699800766, -22.5020205822))
            Line((5.0699800766, -22.5020205822), (5.0699800766, -23.3310142565))
        make_face()
        with BuildLine():
            Line((-5.0699800766, -22.5020205822), (-6.28125, -23.945555865))
            ThreePointArc((-6.28125, -23.945555865), (-5.6839265838, -23.6219028907), (-5.0699800766, -23.3310142565))
            Line((-5.0699800766, -23.3310142565), (-5.0699800766, -22.5020205822))
        make_face()
        Polygon((-6.3973089761, -10.8116069164), (-6.28125, -23.945555865), (-5.0699800766, -22.5020205822), (-5.0699800766, -12.3934559009), align=None)
        Polygon((6.28125, -23.945555865), (6.3973089761, -10.8116069164), (5.0699800766, -12.3934559009), (5.0699800766, -22.5020205822), align=None)
        with BuildLine():
            Line((-5.0699800766, -12.3934559009), (-5.0699800766, -11.4939857435))
            ThreePointArc((-5.0699800766, -11.4939857435), (-5.7437870583, -11.1725250718), (-6.3973089761, -10.8116069164))
            Line((-6.3973089761, -10.8116069164), (-5.0699800766, -12.3934559009))
        make_face()
        with BuildLine():
            Line((5.0699800766, -12.3934559009), (6.3973089761, -10.8116069164))
            ThreePointArc((6.3973089761, -10.8116069164), (5.7437870583, -11.1725250718), (5.0699800766, -11.4939857435))
            Line((5.0699800766, -11.4939857435), (5.0699800766, -12.3934559009))
        make_face()
        with BuildLine():
            ThreePointArc((12.5617807334, -0.134428631), (12.5623201821, -0.0672152776), (12.5625, 0))
            ThreePointArc((12.5625, 0), (12.5456200156, 0.6510181823), (12.4950254251, 1.300286844))
            ThreePointArc((12.4950254251, 1.300286844), (12.3979510712, 2.0266266272), (12.2586909143, 2.7460705232))
            ThreePointArc((12.2586909143, 2.7460705232), (10.879444135, 6.28125), (8.5075122908, 9.2433024873))
            ThreePointArc((8.5075122908, 9.2433024873), (7.9540856787, 9.723627269), (7.3735941516, 10.1708660171))
            ThreePointArc((7.3735941516, 10.1708660171), (6.7801201382, 10.5757447568), (6.1644717573, 10.9460355474))
            ThreePointArc((6.1644717573, 10.9460355474), (0, 12.5625), (-6.1644717573, 10.9460355474))
            ThreePointArc((-6.1644717573, 10.9460355474), (-6.7801201382, 10.5757447568), (-7.3735941516, 10.1708660171))
            ThreePointArc((-7.3735941516, 10.1708660171), (-7.9540856787, 9.723627269), (-8.5075122908, 9.2433024873))
            ThreePointArc((-8.5075122908, 9.2433024873), (-10.879444135, 6.28125), (-12.2586909143, 2.7460705232))
            ThreePointArc((-12.2586909143, 2.7460705232), (-12.3979510712, 2.0266266272), (-12.4950254251, 1.300286844))
            ThreePointArc((-12.4950254251, 1.300286844), (-12.5489236925, 0.583883902), (-12.5617807334, -0.134428631))
            ThreePointArc((-12.5617807334, -0.134428631), (-10.879444135, -6.28125), (-6.3973089761, -10.8116069164))
            ThreePointArc((-6.3973089761, -10.8116069164), (-5.7437870583, -11.1725250718), (-5.0699800766, -11.4939857435))
            ThreePointArc((-5.0699800766, -11.4939857435), (-4.4175289857, -11.760180437), (-3.7511786235, -11.9893730105))
            ThreePointArc((-3.7511786235, -11.9893730105), (0, -12.5625), (3.7511786235, -11.9893730105))
            ThreePointArc((3.7511786235, -11.9893730105), (4.4175289857, -11.760180437), (5.0699800766, -11.4939857435))
            ThreePointArc((5.0699800766, -11.4939857435), (5.7437870583, -11.1725250718), (6.3973089761, -10.8116069164))
            ThreePointArc((6.3973089761, -10.8116069164), (10.879444135, -6.28125), (12.5617807334, -0.134428631))
        make_face()
        Circle(F0_R, mode=Mode.SUBTRACT)
        with BuildLine():
            Line((5.0699800766, -22.5020205822), (0.8289336287, -17.4477382415))
            Line((0.8289336287, -17.4477382415), (0, -18.4356228716))
            Line((0, -18.4356228716), (3.671321038, -22.8109329082))
            ThreePointArc((3.671321038, -22.8109329082), (4.3783795457, -23.0501879504), (5.0699800766, -23.3310142565))
            Line((5.0699800766, -23.3310142565), (5.0699800766, -22.5020205822))
        make_face()
        Polygon((0, -18.4356228716), (0.8289336287, -17.4477382415), (0, -16.4598536115), (-0.8289336287, -17.4477382415), align=None)
        with BuildLine():
            Line((0, -16.4598536115), (-3.7511786235, -11.9893730105))
            ThreePointArc((-3.7511786235, -11.9893730105), (-4.4175289857, -11.760180437), (-5.0699800766, -11.4939857435))
            Line((-5.0699800766, -11.4939857435), (-5.0699800766, -12.3934559009))
            Line((-5.0699800766, -12.3934559009), (-0.8289336287, -17.4477382415))
            Line((-0.8289336287, -17.4477382415), (0, -16.4598536115))
        make_face()
        with BuildLine():
            Line((16.9280978903, 15.5751607521), (14.6957177414, 9.4417467013))
            Line((14.6957177414, 9.4417467013), (15.9657177414, 9.2178114358))
            Line((15.9657177414, 9.2178114358), (17.9191868635, 14.5849237385))
            ThreePointArc((17.9191868635, 14.5849237385), (17.777731299, 15.2882816033), (17.6766586284, 15.998567657))
            Line((17.6766586284, 15.998567657), (16.9280978903, 15.5751607521))
        make_face()
        Polygon((14.6957177414, 9.4417467013), (14.2546513701, 8.2299268057), (15.5246513701, 8.0059915402), (15.9657177414, 9.2178114358), align=None)
        with BuildLine():
            ThreePointArc((12.2586909143, 2.7460705232), (12.3979510712, 2.0266266272), (12.4950254251, 1.300286844))
            Line((12.4950254251, 1.300286844), (13.2447523803, 1.742020547))
            Line((13.2447523803, 1.742020547), (15.5246513701, 8.0059915402))
            Line((15.5246513701, 8.0059915402), (14.2546513701, 8.2299268057))
            Line((14.2546513701, 8.2299268057), (12.2586909143, 2.7460705232))
        make_face()
        with BuildLine():
            Line((-15.5246513701, 8.0059915402), (-15.9657177414, 9.2178114358))
            Line((-15.9657177414, 9.2178114358), (-21.5905079016, 8.2260091697))
            ThreePointArc((-21.5905079016, 8.2260091697), (-22.1289058982, 7.7518261249), (-22.6934953293, 7.3091515977))
            Line((-22.6934953293, 7.3091515977), (-21.9525338245, 6.8725824347))
            Line((-21.9525338245, 6.8725824347), (-15.5246513701, 8.0059915402))
        make_face()
        Polygon((-14.2546513701, 8.2299268057), (-14.6957177414, 9.4417467013), (-15.9657177414, 9.2178114358), (-15.5246513701, 8.0059915402), align=None)
        with BuildLine():
            ThreePointArc((-8.5075122908, 9.2433024873), (-7.9540856787, 9.723627269), (-7.3735941516, 10.1708660171))
            Line((-7.3735941516, 10.1708660171), (-8.1310102377, 10.5992817546))
            Line((-8.1310102377, 10.5992817546), (-14.6957177414, 9.4417467013))
            Line((-14.6957177414, 9.4417467013), (-14.2546513701, 8.2299268057))
            Line((-14.2546513701, 8.2299268057), (-8.5075122908, 9.2433024873))
        make_face()
    extrude(amount=-F2_DEPTH)


solid = f1.part
